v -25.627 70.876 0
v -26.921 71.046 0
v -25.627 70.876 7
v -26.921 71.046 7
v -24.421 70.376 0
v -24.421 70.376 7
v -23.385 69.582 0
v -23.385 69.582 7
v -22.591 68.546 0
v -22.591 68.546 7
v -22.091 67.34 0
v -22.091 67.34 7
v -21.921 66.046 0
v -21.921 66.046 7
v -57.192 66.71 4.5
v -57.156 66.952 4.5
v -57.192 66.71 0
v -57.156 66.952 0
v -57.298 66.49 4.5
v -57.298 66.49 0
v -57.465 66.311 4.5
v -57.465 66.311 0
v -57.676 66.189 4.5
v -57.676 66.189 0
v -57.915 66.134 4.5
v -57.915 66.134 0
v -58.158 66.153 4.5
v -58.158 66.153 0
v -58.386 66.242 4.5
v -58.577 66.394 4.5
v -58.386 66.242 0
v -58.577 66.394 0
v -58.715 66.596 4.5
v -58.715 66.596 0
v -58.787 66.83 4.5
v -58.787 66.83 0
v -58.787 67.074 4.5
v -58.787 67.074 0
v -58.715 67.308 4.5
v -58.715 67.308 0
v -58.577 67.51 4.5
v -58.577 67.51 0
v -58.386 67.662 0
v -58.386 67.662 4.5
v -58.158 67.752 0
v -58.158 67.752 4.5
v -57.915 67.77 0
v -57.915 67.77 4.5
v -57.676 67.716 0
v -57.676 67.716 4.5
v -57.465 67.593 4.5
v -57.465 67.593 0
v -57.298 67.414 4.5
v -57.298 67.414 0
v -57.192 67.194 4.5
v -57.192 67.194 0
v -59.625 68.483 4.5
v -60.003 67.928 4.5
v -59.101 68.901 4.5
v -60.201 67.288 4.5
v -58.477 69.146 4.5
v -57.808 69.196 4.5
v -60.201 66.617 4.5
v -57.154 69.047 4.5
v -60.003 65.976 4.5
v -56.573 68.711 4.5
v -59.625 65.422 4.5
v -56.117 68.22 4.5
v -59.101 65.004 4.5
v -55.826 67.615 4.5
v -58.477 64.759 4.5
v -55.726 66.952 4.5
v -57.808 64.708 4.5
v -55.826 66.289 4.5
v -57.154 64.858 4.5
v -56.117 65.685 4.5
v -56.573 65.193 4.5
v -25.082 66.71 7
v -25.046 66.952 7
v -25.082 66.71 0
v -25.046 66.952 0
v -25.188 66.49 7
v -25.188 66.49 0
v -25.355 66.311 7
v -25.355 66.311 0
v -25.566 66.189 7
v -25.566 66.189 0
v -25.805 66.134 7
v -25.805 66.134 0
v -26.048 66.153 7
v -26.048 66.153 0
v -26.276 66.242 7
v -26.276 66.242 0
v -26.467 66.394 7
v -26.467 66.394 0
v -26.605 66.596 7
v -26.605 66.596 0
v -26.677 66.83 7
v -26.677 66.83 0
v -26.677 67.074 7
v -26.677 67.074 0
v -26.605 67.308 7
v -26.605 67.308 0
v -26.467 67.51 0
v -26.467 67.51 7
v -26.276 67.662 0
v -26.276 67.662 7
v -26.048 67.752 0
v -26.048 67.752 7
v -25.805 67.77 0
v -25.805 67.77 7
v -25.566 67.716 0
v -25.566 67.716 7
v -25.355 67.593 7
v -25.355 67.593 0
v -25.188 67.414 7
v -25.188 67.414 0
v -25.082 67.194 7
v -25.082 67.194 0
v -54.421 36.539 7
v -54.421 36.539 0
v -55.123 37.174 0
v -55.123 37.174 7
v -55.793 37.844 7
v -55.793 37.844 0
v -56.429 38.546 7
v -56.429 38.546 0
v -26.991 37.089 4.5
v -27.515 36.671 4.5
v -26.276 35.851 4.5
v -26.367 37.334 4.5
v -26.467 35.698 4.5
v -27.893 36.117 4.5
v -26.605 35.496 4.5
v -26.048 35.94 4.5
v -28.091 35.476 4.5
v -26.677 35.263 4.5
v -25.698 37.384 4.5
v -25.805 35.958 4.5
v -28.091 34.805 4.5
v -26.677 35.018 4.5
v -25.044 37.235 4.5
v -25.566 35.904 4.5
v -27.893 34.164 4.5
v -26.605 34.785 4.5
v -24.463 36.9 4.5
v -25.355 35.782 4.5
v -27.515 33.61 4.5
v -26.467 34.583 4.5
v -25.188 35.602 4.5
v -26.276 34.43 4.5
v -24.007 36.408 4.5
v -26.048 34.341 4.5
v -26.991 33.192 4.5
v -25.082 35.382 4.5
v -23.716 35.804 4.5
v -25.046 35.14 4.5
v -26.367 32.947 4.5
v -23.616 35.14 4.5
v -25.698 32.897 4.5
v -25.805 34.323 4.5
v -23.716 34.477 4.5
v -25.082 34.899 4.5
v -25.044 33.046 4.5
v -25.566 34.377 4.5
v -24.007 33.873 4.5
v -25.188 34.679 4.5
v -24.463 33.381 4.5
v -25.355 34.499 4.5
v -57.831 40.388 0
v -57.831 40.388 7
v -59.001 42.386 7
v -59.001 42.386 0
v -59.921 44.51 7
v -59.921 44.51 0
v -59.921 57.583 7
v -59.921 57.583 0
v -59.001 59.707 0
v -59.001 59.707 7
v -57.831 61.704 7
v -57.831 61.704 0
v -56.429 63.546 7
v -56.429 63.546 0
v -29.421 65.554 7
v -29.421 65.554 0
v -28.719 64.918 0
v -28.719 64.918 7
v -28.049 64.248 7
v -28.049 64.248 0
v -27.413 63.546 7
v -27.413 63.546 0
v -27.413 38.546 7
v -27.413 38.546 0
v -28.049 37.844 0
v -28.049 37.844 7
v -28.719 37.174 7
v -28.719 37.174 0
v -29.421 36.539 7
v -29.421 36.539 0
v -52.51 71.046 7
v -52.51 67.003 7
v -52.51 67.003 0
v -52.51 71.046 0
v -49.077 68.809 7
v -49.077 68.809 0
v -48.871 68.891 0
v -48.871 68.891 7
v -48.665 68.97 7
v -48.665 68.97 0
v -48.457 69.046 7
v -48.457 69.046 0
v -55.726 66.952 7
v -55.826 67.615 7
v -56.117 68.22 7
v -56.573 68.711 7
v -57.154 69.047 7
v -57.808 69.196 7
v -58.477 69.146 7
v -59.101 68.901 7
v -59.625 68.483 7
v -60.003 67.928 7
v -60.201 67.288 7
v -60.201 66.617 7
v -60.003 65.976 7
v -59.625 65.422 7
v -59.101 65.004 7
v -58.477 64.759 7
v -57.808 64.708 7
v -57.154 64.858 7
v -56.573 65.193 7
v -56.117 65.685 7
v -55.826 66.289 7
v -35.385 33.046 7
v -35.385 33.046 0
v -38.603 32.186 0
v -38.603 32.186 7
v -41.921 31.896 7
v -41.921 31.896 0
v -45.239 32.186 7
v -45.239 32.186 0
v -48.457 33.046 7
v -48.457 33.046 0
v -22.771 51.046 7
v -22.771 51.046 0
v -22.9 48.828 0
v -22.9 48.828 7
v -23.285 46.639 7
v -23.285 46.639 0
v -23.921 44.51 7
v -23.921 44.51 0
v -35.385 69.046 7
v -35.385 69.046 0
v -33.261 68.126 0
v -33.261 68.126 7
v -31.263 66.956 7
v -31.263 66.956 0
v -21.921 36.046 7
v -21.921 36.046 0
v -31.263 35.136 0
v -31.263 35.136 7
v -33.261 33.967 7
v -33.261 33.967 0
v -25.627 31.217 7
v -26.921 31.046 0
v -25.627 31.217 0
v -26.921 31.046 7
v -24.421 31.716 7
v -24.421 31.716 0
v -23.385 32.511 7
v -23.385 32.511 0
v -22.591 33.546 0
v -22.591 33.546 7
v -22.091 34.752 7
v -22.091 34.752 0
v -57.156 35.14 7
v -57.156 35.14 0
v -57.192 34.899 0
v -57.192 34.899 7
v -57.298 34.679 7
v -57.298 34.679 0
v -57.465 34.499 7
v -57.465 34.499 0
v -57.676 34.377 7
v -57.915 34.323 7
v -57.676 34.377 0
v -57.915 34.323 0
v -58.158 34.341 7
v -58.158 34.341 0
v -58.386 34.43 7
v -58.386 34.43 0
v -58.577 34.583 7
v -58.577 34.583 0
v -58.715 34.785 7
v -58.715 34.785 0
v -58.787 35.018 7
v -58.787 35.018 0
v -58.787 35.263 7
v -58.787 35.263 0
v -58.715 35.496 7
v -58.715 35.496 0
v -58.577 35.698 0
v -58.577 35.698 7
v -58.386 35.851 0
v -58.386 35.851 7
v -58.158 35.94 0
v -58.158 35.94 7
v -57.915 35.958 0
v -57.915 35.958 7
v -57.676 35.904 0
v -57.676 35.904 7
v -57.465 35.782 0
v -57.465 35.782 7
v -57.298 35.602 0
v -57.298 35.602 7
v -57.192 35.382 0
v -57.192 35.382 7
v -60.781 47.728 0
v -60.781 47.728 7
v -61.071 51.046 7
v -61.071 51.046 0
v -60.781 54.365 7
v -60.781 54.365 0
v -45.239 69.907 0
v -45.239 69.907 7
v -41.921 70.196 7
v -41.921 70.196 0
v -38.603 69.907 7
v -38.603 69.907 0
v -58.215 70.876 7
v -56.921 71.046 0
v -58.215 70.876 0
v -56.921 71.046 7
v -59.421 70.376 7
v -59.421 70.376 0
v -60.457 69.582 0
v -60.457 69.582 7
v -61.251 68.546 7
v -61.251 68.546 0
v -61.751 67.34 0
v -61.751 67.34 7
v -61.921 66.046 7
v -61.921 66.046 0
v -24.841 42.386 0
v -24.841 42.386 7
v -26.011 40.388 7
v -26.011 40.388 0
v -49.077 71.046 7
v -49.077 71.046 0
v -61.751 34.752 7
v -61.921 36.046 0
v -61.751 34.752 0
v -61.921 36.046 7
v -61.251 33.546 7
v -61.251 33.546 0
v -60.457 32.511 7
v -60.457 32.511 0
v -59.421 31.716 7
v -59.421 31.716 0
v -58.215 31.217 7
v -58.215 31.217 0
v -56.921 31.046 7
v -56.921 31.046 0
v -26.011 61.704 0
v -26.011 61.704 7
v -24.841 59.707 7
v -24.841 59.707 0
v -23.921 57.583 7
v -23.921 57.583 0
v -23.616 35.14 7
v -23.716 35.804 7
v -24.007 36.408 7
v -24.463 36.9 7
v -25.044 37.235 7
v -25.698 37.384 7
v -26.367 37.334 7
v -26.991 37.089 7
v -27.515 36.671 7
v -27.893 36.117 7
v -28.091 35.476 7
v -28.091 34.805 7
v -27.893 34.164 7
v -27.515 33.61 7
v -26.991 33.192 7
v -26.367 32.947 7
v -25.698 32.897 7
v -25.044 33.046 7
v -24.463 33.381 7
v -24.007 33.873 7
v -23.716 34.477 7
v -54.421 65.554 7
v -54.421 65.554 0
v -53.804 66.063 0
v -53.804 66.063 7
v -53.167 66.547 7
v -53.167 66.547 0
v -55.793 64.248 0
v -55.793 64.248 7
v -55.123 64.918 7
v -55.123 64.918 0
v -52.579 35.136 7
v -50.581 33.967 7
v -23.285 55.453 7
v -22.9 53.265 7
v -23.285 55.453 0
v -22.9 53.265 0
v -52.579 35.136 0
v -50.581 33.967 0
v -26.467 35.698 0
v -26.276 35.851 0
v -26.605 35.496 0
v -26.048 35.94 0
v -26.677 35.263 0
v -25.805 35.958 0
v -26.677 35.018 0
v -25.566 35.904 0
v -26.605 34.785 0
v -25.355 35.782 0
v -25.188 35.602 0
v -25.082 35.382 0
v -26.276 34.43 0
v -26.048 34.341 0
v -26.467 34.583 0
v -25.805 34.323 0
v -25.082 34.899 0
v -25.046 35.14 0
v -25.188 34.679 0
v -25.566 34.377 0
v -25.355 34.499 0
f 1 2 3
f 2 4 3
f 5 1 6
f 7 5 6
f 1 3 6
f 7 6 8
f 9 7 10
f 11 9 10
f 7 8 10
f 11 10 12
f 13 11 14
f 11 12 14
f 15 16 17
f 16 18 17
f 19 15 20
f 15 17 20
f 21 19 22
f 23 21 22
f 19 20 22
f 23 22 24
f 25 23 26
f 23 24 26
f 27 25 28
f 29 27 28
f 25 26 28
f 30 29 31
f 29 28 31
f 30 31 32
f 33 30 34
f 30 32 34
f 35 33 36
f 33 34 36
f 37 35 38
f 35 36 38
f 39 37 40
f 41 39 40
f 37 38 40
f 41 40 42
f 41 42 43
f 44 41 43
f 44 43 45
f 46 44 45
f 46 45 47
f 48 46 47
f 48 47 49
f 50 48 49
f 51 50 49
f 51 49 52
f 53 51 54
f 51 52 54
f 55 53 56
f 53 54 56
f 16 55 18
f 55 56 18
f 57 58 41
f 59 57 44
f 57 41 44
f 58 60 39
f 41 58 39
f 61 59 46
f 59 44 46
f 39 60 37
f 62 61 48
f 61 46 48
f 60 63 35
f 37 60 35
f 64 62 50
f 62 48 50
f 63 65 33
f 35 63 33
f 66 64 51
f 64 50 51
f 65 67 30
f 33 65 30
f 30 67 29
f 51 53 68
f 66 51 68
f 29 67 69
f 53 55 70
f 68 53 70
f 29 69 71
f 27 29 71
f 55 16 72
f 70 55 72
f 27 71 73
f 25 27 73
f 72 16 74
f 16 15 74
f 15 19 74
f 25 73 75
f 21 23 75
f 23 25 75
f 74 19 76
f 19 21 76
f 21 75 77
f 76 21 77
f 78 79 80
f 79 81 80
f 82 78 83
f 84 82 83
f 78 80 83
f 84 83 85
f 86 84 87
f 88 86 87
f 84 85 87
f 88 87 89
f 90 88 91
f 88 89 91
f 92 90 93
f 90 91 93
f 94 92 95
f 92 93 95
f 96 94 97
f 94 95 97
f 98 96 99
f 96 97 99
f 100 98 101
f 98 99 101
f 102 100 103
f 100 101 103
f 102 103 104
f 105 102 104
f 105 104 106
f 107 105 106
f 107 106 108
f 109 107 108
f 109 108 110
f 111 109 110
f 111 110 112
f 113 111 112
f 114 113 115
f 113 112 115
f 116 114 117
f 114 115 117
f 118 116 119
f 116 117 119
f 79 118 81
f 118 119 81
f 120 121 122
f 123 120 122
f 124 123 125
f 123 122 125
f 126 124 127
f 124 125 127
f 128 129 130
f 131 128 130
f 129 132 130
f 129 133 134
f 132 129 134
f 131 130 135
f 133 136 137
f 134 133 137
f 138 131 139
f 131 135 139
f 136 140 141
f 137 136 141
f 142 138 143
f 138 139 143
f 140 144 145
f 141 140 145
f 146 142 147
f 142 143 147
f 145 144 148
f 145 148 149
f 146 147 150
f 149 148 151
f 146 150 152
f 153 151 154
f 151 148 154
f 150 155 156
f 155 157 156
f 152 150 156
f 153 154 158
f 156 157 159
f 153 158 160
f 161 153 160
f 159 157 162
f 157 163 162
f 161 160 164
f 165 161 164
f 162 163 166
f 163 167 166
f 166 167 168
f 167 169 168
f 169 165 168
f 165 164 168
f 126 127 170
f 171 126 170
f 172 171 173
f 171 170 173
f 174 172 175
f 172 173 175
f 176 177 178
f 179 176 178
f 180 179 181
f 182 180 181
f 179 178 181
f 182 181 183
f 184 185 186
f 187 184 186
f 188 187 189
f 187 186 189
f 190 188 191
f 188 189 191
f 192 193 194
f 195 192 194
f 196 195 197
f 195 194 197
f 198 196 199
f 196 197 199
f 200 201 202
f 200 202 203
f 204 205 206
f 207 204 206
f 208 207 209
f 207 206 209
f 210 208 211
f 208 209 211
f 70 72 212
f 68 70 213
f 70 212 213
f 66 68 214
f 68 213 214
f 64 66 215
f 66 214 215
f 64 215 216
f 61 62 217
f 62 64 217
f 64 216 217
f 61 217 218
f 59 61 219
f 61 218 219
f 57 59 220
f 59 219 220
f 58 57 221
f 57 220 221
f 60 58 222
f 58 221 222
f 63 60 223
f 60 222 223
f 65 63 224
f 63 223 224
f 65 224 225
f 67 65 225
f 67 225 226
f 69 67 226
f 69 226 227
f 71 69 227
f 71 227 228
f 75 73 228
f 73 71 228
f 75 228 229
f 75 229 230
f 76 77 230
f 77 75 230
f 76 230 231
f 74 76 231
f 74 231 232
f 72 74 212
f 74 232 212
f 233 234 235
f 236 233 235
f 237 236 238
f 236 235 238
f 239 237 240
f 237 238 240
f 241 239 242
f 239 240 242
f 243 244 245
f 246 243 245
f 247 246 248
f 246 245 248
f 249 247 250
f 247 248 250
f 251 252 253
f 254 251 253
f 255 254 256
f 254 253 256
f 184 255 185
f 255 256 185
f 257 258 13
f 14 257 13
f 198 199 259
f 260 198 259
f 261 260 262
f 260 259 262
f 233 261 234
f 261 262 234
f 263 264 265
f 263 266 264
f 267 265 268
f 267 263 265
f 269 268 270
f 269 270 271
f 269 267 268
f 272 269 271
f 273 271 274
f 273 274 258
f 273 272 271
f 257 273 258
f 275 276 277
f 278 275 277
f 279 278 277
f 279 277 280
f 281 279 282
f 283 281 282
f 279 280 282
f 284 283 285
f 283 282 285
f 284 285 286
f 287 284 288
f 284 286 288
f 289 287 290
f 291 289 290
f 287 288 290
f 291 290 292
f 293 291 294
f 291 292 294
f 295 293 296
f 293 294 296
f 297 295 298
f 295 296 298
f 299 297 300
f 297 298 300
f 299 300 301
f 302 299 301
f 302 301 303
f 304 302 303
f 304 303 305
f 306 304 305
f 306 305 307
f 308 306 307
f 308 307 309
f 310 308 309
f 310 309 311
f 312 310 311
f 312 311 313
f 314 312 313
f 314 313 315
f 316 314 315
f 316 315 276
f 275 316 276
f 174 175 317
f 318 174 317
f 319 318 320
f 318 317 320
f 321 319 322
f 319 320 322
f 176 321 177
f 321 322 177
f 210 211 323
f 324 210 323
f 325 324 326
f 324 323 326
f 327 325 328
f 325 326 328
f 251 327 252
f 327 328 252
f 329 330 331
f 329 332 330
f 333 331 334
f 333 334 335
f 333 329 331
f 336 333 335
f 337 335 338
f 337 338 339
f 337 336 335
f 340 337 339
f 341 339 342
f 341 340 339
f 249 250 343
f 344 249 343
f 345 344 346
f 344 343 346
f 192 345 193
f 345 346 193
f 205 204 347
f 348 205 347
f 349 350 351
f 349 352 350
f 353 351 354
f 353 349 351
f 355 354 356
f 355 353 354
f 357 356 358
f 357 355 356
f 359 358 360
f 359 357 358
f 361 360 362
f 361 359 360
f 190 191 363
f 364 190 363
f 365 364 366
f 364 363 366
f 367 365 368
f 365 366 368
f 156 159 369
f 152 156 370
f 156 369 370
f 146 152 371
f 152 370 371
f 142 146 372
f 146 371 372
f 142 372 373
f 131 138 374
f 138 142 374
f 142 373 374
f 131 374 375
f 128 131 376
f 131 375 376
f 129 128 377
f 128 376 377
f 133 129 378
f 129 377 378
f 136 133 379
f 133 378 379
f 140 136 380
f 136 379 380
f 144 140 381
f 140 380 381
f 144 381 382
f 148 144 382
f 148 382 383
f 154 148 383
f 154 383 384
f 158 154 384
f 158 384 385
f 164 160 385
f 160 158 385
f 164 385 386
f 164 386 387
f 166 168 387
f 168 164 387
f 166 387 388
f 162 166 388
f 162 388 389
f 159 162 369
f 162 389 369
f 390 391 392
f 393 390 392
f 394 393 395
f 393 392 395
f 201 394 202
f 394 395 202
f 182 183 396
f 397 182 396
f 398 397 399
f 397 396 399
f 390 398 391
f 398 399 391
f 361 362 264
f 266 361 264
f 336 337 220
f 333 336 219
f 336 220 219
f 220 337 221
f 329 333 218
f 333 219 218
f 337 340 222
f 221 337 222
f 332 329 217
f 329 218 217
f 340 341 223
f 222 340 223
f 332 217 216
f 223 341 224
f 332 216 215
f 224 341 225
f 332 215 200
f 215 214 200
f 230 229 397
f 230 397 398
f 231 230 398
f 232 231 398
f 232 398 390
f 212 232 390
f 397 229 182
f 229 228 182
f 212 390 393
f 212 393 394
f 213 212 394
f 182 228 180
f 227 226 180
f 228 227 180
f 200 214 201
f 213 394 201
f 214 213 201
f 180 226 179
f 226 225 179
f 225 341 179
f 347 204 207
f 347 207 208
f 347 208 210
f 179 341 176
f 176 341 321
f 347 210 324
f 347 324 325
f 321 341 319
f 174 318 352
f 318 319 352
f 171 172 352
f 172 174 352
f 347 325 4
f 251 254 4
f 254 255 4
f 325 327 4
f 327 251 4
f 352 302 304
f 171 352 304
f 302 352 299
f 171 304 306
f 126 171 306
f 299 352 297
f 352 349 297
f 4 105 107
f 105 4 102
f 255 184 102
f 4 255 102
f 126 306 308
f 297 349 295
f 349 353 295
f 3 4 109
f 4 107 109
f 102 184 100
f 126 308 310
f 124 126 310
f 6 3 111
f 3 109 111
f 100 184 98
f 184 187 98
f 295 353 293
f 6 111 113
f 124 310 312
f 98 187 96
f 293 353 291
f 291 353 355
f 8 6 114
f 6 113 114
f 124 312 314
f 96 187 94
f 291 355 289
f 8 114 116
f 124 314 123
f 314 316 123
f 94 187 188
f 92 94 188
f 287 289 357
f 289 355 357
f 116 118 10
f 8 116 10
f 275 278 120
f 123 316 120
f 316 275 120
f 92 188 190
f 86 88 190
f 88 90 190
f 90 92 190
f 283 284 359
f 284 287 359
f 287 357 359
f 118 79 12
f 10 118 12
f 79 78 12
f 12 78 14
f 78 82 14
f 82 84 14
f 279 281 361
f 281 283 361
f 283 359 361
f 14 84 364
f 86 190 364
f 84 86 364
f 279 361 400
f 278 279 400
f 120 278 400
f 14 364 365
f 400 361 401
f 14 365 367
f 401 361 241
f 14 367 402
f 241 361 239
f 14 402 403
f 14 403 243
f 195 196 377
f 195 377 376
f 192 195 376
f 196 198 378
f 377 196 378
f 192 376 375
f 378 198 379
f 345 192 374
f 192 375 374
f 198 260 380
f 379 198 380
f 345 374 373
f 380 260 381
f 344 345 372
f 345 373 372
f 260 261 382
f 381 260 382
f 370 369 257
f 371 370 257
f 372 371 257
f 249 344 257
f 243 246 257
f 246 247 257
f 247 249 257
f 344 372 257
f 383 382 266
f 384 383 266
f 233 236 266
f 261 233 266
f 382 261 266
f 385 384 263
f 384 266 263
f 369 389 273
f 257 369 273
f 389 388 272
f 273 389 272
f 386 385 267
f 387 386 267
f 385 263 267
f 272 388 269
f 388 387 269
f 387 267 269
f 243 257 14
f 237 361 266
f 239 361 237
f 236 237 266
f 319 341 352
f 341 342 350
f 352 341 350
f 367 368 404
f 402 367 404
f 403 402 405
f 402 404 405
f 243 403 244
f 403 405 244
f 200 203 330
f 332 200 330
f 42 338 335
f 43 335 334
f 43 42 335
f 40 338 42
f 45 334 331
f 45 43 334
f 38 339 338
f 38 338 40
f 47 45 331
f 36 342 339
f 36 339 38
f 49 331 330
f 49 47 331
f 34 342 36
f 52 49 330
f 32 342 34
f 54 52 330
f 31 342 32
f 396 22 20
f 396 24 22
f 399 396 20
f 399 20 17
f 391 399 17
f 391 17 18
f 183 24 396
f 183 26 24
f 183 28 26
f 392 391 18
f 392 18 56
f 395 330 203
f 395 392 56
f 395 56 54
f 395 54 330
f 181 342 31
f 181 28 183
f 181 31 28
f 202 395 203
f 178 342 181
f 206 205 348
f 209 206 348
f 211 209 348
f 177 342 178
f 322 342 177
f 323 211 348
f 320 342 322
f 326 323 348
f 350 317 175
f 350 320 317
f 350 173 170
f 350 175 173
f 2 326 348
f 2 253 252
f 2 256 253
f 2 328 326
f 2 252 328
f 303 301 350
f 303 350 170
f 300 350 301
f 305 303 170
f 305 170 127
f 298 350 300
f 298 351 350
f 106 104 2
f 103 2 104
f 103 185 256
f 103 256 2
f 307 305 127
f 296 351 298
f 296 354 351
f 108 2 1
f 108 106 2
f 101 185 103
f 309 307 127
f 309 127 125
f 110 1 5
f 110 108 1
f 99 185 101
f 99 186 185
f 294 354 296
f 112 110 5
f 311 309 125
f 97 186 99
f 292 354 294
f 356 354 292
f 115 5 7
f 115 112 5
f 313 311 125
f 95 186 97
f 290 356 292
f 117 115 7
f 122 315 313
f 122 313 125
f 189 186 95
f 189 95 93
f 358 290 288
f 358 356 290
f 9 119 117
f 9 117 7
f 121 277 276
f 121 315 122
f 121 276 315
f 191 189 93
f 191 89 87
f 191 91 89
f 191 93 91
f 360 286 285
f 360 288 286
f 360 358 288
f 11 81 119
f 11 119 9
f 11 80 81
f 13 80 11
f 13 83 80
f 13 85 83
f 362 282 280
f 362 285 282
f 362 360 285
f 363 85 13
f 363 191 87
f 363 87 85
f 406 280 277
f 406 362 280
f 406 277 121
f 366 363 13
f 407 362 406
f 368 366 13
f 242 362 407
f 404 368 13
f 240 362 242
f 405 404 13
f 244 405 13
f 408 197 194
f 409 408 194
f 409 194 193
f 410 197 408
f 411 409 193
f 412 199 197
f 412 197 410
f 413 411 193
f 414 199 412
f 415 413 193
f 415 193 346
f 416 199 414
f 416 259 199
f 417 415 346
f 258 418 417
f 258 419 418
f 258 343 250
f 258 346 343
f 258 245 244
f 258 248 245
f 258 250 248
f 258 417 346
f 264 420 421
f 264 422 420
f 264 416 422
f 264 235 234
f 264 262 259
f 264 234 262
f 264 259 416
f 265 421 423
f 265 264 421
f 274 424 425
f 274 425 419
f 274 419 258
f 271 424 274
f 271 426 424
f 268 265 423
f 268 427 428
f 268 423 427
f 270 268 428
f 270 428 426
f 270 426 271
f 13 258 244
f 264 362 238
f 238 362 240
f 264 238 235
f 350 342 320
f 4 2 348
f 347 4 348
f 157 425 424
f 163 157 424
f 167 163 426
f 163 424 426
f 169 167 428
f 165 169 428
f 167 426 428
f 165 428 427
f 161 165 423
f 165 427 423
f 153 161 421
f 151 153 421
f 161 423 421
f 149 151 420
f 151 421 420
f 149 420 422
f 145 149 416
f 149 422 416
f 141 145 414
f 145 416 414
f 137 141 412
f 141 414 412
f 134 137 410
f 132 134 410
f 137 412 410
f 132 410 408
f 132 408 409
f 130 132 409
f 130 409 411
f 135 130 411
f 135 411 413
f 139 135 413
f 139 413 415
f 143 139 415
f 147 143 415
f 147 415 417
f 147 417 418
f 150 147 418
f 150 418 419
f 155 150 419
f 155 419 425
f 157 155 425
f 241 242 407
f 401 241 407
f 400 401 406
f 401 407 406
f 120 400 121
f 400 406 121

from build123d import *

# Parameters (mm, degrees)
F0_R      = 2
F1_DEPTH  = 7
F2_R      = 5
F3_W      = 3.4330971539
F3_H      = 4.5472582311
F4_DEPTH  = 25
F5_R      = 2.25
F6_DEPTH  = 25
F7_R      = 2.25
F7_R_2    = 0.82
F8_DEPTH  = 2.5
F9_DEPTH  = 4.5
F10_DEPTH = 2


with BuildPart() as f1:
    # F0 (on Top) → F1 (new body)
    with BuildSketch(Plane.XY):
        with BuildLine():
            Line((-23.9209998254, 63.5463201136), (-21.9209998254, 63.5463201136))
            Line((-21.9209998254, 63.5463201136), (-21.9209998254, 71.0463201136))
            Line((-21.9209998254, 71.0463201136), (-29.4209998254, 71.0463201136))
            Line((-29.4209998254, 71.0463201136), (-29.4209998254, 69.0463201136))
            Line((-29.4209998254, 69.0463201136), (-29.4209998254, 65.5539904986))
            ThreePointArc((-29.4209998254, 65.5539904986), (-28.3799049656, 64.5874149733), (-27.4133294404, 63.5463201136))
            Line((-27.4133294404, 63.5463201136), (-23.9209998254, 63.5463201136))
        make_face()
        with Locations((-25.8659998254, 66.9521987438)):
            Circle(F0_R, mode=Mode.SUBTRACT)
        with BuildLine():
            Line((-29.4209998254, 65.5539904986), (-29.4209998254, 69.0463201136))
            Line((-29.4209998254, 69.0463201136), (-35.3847547259, 69.0463201136))
            ThreePointArc((-35.3847547259, 69.0463201136), (-32.244029824, 67.5714147152), (-29.4209998254, 65.5539904986))
        make_face()
        with BuildLine():
            Line((-29.4209998254, 69.0463201136), (-29.4209998254, 71.0463201136))
            Line((-29.4209998254, 71.0463201136), (-54.4209998254, 71.0463201136))
            Line((-54.4209998254, 71.0463201136), (-54.4209998254, 69.0463201136))
            Line((-54.4209998254, 69.0463201136), (-48.4572449248, 69.0463201136))
            ThreePointArc((-48.4572449248, 69.0463201136), (-41.9209998254, 70.1963201136), (-35.3847547259, 69.0463201136))
            Line((-35.3847547259, 69.0463201136), (-29.4209998254, 69.0463201136))
        make_face()
        with BuildLine():
            Line((-48.4572449248, 69.0463201136), (-54.4209998254, 69.0463201136))
            Line((-54.4209998254, 69.0463201136), (-54.4209998254, 65.5539904986))
            ThreePointArc((-54.4209998254, 65.5539904986), (-51.5979698267, 67.5714147152), (-48.4572449248, 69.0463201136))
        make_face()
        with BuildLine():
            Line((-61.9209998254, 71.0463201136), (-61.9209998254, 63.5463201136))
            Line((-61.9209998254, 63.5463201136), (-59.9209998254, 63.5463201136))
            Line((-59.9209998254, 63.5463201136), (-56.4286702104, 63.5463201136))
            ThreePointArc((-56.4286702104, 63.5463201136), (-55.4620946851, 64.5874149733), (-54.4209998254, 65.5539904986))
            Line((-54.4209998254, 65.5539904986), (-54.4209998254, 69.0463201136))
            Line((-54.4209998254, 69.0463201136), (-54.4209998254, 71.0463201136))
            Line((-54.4209998254, 71.0463201136), (-61.9209998254, 71.0463201136))
        make_face()
        with Locations((-57.9759998254, 66.9521987438)):
            Circle(F0_R, mode=Mode.SUBTRACT)
        with BuildLine():
            Line((-56.4286702104, 63.5463201136), (-59.9209998254, 63.5463201136))
            Line((-59.9209998254, 63.5463201136), (-59.9209998254, 57.582565213))
            ThreePointArc((-59.9209998254, 57.582565213), (-58.446094427, 60.7232901149), (-56.4286702104, 63.5463201136))
        make_face()
        with BuildLine():
            Line((-61.9209998254, 63.5463201136), (-61.9209998254, 38.5463201136))
            Line((-61.9209998254, 38.5463201136), (-59.9209998254, 38.5463201136))
            Line((-59.9209998254, 38.5463201136), (-59.9209998254, 44.5100750141))
            ThreePointArc((-59.9209998254, 44.5100750141), (-61.0709998254, 51.0463201136), (-59.9209998254, 57.582565213))
            Line((-59.9209998254, 57.582565213), (-59.9209998254, 63.5463201136))
            Line((-59.9209998254, 63.5463201136), (-61.9209998254, 63.5463201136))
        make_face()
        with BuildLine():
            Line((-59.9209998254, 44.5100750141), (-59.9209998254, 38.5463201136))
            Line((-59.9209998254, 38.5463201136), (-56.4286702104, 38.5463201136))
            ThreePointArc((-56.4286702104, 38.5463201136), (-58.446094427, 41.3693501123), (-59.9209998254, 44.5100750141))
        make_face()
        with BuildLine():
            Line((-61.9209998254, 31.0463201136), (-54.4209998254, 31.0463201136))
            Line((-54.4209998254, 31.0463201136), (-54.4209998254, 33.0463201136))
            Line((-54.4209998254, 33.0463201136), (-54.4209998254, 36.5386497286))
            ThreePointArc((-54.4209998254, 36.5386497286), (-55.4620946851, 37.5052252539), (-56.4286702104, 38.5463201136))
            Line((-56.4286702104, 38.5463201136), (-59.9209998254, 38.5463201136))
            Line((-59.9209998254, 38.5463201136), (-61.9209998254, 38.5463201136))
            Line((-61.9209998254, 38.5463201136), (-61.9209998254, 31.0463201136))
        make_face()
        with Locations((-57.9759998254, 35.1404414833)):
            Circle(F0_R, mode=Mode.SUBTRACT)
        with BuildLine():
            Line((-54.4209998254, 36.5386497286), (-54.4209998254, 33.0463201136))
            Line((-54.4209998254, 33.0463201136), (-48.4572449248, 33.0463201136))
            ThreePointArc((-48.4572449248, 33.0463201136), (-51.5979698267, 34.5212255119), (-54.4209998254, 36.5386497286))
        make_face()
        with BuildLine():
            Line((-54.4209998254, 31.0463201136), (-29.4209998254, 31.0463201136))
            Line((-29.4209998254, 31.0463201136), (-29.4209998254, 33.0463201136))
            Line((-29.4209998254, 33.0463201136), (-35.3847547259, 33.0463201136))
            ThreePointArc((-35.3847547259, 33.0463201136), (-41.9209998254, 31.8963201136), (-48.4572449248, 33.0463201136))
            Line((-48.4572449248, 33.0463201136), (-54.4209998254, 33.0463201136))
            Line((-54.4209998254, 33.0463201136), (-54.4209998254, 31.0463201136))
        make_face()
        with BuildLine():
            Line((-35.3847547259, 33.0463201136), (-29.4209998254, 33.0463201136))
            Line((-29.4209998254, 33.0463201136), (-29.4209998254, 36.5386497286))
            ThreePointArc((-29.4209998254, 36.5386497286), (-32.244029824, 34.5212255119), (-35.3847547259, 33.0463201136))
        make_face()
        with BuildLine():
            Line((-29.4209998254, 31.0463201136), (-21.9209998254, 31.0463201136))
            Line((-21.9209998254, 31.0463201136), (-21.9209998254, 38.5463201136))
            Line((-21.9209998254, 38.5463201136), (-23.9209998254, 38.5463201136))
            Line((-23.9209998254, 38.5463201136), (-27.4133294404, 38.5463201136))
            ThreePointArc((-27.4133294404, 38.5463201136), (-28.3799049656, 37.5052252539), (-29.4209998254, 36.5386497286))
            Line((-29.4209998254, 36.5386497286), (-29.4209998254, 33.0463201136))
            Line((-29.4209998254, 33.0463201136), (-29.4209998254, 31.0463201136))
        make_face()
        with Locations((-25.8659998254, 35.1404414833)):
            Circle(F0_R, mode=Mode.SUBTRACT)
        with BuildLine():
            Line((-27.4133294404, 38.5463201136), (-23.9209998254, 38.5463201136))
            Line((-23.9209998254, 38.5463201136), (-23.9209998254, 44.5100750141))
            ThreePointArc((-23.9209998254, 44.5100750141), (-25.3959052237, 41.3693501123), (-27.4133294404, 38.5463201136))
        make_face()
        with BuildLine():
            Line((-23.9209998254, 38.5463201136), (-21.9209998254, 38.5463201136))
            Line((-21.9209998254, 38.5463201136), (-21.9209998254, 63.5463201136))
            Line((-21.9209998254, 63.5463201136), (-23.9209998254, 63.5463201136))
            Line((-23.9209998254, 63.5463201136), (-23.9209998254, 57.582565213))
            ThreePointArc((-23.9209998254, 57.582565213), (-23.0606909732, 54.3646404718), (-22.7709998254, 51.0463201136))
            ThreePointArc((-22.7709998254, 51.0463201136), (-23.0606909732, 47.7279997553), (-23.9209998254, 44.5100750141))
            Line((-23.9209998254, 44.5100750141), (-23.9209998254, 38.5463201136))
        make_face()
        with BuildLine():
            Line((-23.9209998254, 57.582565213), (-23.9209998254, 63.5463201136))
            Line((-23.9209998254, 63.5463201136), (-27.4133294404, 63.5463201136))
            ThreePointArc((-27.4133294404, 63.5463201136), (-25.3959052237, 60.7232901149), (-23.9209998254, 57.582565213))
        make_face()
    extrude(amount=F1_DEPTH)

    # F2
    f2_edges = [f1.edges().sort_by_distance(p)[0] for p in [
        (-21.921, 31.04632, 3.5),
        (-61.921, 31.04632, 3.5),
        (-21.921, 71.04632, 3.5),
        (-61.921, 71.04632, 3.5),
    ]]
    fillet(f2_edges, radius=F2_R)

    # F3 (on face) → F4 (cut)
    with BuildSketch(Plane.XY.offset(7)):
        with Locations((-50.7930722088, 68.772690998)):
            Rectangle(F3_W, F3_H)
    extrude(amount=-F4_DEPTH, mode=Mode.SUBTRACT)

    # F5 (on face) → F6 (cut)
    with BuildSketch(Plane.XY.offset(7)):
        with Locations((-57.9759998254, 66.9521987438)):
            Circle(F5_R)
        with Locations((-25.8659998254, 66.9521987438)):
            Circle(F5_R)
        with Locations((-25.8659998254, 35.1404414833)):
            Circle(F5_R)
        with Locations((-57.9759998254, 35.1404414833)):
            Circle(F5_R)
    extrude(amount=-F6_DEPTH, mode=Mode.SUBTRACT)

    # F7 (on face) → F8 (join)
    with BuildSketch(Plane(origin=(0, 0, 0), x_dir=(1, 0, 0), z_dir=(0, 0, -1))):
        with Locations((-25.8659998254, -66.9521987438)):
            Circle(F7_R)
        with Locations((-25.8659998254, -66.9521987438)):
            Circle(F7_R_2, mode=Mode.SUBTRACT)
        with Locations((-57.9759998254, -66.9521987438)):
            Circle(F7_R)
        with Locations((-57.9759998254, -66.9521987438)):
            Circle(F7_R_2, mode=Mode.SUBTRACT)
        with Locations((-57.9759998254, -35.1404414833)):
            Circle(F7_R)
        with Locations((-57.9759998254, -35.1404414833)):
            Circle(F7_R_2, mode=Mode.SUBTRACT)
        with Locations((-25.8659998254, -35.1404414833)):
            Circle(F7_R)
        with Locations((-25.8659998254, -35.1404414833)):
            Circle(F7_R_2, mode=Mode.SUBTRACT)
    extrude(amount=-F8_DEPTH)

    # F9 (add): faces of the model
    f9_faces = [f1.faces().sort_by_distance(p)[0] for p in [
        (-28.0523602151, 66.9521987438, 2.5),
        (-60.1623602151, 35.1404414833, 2.5),
    ]]
    extrude(f9_faces, amount=F9_DEPTH)

    # F10 (add): faces of the model
    f10_faces = [f1.faces().sort_by_distance(p)[0] for p in [
        (-60.1623602151, 66.9521987438, 2.5),
        (-28.0523602151, 35.1404414833, 2.5),
    ]]
    extrude(f10_faces, amount=F10_DEPTH)


solid = f1.part
